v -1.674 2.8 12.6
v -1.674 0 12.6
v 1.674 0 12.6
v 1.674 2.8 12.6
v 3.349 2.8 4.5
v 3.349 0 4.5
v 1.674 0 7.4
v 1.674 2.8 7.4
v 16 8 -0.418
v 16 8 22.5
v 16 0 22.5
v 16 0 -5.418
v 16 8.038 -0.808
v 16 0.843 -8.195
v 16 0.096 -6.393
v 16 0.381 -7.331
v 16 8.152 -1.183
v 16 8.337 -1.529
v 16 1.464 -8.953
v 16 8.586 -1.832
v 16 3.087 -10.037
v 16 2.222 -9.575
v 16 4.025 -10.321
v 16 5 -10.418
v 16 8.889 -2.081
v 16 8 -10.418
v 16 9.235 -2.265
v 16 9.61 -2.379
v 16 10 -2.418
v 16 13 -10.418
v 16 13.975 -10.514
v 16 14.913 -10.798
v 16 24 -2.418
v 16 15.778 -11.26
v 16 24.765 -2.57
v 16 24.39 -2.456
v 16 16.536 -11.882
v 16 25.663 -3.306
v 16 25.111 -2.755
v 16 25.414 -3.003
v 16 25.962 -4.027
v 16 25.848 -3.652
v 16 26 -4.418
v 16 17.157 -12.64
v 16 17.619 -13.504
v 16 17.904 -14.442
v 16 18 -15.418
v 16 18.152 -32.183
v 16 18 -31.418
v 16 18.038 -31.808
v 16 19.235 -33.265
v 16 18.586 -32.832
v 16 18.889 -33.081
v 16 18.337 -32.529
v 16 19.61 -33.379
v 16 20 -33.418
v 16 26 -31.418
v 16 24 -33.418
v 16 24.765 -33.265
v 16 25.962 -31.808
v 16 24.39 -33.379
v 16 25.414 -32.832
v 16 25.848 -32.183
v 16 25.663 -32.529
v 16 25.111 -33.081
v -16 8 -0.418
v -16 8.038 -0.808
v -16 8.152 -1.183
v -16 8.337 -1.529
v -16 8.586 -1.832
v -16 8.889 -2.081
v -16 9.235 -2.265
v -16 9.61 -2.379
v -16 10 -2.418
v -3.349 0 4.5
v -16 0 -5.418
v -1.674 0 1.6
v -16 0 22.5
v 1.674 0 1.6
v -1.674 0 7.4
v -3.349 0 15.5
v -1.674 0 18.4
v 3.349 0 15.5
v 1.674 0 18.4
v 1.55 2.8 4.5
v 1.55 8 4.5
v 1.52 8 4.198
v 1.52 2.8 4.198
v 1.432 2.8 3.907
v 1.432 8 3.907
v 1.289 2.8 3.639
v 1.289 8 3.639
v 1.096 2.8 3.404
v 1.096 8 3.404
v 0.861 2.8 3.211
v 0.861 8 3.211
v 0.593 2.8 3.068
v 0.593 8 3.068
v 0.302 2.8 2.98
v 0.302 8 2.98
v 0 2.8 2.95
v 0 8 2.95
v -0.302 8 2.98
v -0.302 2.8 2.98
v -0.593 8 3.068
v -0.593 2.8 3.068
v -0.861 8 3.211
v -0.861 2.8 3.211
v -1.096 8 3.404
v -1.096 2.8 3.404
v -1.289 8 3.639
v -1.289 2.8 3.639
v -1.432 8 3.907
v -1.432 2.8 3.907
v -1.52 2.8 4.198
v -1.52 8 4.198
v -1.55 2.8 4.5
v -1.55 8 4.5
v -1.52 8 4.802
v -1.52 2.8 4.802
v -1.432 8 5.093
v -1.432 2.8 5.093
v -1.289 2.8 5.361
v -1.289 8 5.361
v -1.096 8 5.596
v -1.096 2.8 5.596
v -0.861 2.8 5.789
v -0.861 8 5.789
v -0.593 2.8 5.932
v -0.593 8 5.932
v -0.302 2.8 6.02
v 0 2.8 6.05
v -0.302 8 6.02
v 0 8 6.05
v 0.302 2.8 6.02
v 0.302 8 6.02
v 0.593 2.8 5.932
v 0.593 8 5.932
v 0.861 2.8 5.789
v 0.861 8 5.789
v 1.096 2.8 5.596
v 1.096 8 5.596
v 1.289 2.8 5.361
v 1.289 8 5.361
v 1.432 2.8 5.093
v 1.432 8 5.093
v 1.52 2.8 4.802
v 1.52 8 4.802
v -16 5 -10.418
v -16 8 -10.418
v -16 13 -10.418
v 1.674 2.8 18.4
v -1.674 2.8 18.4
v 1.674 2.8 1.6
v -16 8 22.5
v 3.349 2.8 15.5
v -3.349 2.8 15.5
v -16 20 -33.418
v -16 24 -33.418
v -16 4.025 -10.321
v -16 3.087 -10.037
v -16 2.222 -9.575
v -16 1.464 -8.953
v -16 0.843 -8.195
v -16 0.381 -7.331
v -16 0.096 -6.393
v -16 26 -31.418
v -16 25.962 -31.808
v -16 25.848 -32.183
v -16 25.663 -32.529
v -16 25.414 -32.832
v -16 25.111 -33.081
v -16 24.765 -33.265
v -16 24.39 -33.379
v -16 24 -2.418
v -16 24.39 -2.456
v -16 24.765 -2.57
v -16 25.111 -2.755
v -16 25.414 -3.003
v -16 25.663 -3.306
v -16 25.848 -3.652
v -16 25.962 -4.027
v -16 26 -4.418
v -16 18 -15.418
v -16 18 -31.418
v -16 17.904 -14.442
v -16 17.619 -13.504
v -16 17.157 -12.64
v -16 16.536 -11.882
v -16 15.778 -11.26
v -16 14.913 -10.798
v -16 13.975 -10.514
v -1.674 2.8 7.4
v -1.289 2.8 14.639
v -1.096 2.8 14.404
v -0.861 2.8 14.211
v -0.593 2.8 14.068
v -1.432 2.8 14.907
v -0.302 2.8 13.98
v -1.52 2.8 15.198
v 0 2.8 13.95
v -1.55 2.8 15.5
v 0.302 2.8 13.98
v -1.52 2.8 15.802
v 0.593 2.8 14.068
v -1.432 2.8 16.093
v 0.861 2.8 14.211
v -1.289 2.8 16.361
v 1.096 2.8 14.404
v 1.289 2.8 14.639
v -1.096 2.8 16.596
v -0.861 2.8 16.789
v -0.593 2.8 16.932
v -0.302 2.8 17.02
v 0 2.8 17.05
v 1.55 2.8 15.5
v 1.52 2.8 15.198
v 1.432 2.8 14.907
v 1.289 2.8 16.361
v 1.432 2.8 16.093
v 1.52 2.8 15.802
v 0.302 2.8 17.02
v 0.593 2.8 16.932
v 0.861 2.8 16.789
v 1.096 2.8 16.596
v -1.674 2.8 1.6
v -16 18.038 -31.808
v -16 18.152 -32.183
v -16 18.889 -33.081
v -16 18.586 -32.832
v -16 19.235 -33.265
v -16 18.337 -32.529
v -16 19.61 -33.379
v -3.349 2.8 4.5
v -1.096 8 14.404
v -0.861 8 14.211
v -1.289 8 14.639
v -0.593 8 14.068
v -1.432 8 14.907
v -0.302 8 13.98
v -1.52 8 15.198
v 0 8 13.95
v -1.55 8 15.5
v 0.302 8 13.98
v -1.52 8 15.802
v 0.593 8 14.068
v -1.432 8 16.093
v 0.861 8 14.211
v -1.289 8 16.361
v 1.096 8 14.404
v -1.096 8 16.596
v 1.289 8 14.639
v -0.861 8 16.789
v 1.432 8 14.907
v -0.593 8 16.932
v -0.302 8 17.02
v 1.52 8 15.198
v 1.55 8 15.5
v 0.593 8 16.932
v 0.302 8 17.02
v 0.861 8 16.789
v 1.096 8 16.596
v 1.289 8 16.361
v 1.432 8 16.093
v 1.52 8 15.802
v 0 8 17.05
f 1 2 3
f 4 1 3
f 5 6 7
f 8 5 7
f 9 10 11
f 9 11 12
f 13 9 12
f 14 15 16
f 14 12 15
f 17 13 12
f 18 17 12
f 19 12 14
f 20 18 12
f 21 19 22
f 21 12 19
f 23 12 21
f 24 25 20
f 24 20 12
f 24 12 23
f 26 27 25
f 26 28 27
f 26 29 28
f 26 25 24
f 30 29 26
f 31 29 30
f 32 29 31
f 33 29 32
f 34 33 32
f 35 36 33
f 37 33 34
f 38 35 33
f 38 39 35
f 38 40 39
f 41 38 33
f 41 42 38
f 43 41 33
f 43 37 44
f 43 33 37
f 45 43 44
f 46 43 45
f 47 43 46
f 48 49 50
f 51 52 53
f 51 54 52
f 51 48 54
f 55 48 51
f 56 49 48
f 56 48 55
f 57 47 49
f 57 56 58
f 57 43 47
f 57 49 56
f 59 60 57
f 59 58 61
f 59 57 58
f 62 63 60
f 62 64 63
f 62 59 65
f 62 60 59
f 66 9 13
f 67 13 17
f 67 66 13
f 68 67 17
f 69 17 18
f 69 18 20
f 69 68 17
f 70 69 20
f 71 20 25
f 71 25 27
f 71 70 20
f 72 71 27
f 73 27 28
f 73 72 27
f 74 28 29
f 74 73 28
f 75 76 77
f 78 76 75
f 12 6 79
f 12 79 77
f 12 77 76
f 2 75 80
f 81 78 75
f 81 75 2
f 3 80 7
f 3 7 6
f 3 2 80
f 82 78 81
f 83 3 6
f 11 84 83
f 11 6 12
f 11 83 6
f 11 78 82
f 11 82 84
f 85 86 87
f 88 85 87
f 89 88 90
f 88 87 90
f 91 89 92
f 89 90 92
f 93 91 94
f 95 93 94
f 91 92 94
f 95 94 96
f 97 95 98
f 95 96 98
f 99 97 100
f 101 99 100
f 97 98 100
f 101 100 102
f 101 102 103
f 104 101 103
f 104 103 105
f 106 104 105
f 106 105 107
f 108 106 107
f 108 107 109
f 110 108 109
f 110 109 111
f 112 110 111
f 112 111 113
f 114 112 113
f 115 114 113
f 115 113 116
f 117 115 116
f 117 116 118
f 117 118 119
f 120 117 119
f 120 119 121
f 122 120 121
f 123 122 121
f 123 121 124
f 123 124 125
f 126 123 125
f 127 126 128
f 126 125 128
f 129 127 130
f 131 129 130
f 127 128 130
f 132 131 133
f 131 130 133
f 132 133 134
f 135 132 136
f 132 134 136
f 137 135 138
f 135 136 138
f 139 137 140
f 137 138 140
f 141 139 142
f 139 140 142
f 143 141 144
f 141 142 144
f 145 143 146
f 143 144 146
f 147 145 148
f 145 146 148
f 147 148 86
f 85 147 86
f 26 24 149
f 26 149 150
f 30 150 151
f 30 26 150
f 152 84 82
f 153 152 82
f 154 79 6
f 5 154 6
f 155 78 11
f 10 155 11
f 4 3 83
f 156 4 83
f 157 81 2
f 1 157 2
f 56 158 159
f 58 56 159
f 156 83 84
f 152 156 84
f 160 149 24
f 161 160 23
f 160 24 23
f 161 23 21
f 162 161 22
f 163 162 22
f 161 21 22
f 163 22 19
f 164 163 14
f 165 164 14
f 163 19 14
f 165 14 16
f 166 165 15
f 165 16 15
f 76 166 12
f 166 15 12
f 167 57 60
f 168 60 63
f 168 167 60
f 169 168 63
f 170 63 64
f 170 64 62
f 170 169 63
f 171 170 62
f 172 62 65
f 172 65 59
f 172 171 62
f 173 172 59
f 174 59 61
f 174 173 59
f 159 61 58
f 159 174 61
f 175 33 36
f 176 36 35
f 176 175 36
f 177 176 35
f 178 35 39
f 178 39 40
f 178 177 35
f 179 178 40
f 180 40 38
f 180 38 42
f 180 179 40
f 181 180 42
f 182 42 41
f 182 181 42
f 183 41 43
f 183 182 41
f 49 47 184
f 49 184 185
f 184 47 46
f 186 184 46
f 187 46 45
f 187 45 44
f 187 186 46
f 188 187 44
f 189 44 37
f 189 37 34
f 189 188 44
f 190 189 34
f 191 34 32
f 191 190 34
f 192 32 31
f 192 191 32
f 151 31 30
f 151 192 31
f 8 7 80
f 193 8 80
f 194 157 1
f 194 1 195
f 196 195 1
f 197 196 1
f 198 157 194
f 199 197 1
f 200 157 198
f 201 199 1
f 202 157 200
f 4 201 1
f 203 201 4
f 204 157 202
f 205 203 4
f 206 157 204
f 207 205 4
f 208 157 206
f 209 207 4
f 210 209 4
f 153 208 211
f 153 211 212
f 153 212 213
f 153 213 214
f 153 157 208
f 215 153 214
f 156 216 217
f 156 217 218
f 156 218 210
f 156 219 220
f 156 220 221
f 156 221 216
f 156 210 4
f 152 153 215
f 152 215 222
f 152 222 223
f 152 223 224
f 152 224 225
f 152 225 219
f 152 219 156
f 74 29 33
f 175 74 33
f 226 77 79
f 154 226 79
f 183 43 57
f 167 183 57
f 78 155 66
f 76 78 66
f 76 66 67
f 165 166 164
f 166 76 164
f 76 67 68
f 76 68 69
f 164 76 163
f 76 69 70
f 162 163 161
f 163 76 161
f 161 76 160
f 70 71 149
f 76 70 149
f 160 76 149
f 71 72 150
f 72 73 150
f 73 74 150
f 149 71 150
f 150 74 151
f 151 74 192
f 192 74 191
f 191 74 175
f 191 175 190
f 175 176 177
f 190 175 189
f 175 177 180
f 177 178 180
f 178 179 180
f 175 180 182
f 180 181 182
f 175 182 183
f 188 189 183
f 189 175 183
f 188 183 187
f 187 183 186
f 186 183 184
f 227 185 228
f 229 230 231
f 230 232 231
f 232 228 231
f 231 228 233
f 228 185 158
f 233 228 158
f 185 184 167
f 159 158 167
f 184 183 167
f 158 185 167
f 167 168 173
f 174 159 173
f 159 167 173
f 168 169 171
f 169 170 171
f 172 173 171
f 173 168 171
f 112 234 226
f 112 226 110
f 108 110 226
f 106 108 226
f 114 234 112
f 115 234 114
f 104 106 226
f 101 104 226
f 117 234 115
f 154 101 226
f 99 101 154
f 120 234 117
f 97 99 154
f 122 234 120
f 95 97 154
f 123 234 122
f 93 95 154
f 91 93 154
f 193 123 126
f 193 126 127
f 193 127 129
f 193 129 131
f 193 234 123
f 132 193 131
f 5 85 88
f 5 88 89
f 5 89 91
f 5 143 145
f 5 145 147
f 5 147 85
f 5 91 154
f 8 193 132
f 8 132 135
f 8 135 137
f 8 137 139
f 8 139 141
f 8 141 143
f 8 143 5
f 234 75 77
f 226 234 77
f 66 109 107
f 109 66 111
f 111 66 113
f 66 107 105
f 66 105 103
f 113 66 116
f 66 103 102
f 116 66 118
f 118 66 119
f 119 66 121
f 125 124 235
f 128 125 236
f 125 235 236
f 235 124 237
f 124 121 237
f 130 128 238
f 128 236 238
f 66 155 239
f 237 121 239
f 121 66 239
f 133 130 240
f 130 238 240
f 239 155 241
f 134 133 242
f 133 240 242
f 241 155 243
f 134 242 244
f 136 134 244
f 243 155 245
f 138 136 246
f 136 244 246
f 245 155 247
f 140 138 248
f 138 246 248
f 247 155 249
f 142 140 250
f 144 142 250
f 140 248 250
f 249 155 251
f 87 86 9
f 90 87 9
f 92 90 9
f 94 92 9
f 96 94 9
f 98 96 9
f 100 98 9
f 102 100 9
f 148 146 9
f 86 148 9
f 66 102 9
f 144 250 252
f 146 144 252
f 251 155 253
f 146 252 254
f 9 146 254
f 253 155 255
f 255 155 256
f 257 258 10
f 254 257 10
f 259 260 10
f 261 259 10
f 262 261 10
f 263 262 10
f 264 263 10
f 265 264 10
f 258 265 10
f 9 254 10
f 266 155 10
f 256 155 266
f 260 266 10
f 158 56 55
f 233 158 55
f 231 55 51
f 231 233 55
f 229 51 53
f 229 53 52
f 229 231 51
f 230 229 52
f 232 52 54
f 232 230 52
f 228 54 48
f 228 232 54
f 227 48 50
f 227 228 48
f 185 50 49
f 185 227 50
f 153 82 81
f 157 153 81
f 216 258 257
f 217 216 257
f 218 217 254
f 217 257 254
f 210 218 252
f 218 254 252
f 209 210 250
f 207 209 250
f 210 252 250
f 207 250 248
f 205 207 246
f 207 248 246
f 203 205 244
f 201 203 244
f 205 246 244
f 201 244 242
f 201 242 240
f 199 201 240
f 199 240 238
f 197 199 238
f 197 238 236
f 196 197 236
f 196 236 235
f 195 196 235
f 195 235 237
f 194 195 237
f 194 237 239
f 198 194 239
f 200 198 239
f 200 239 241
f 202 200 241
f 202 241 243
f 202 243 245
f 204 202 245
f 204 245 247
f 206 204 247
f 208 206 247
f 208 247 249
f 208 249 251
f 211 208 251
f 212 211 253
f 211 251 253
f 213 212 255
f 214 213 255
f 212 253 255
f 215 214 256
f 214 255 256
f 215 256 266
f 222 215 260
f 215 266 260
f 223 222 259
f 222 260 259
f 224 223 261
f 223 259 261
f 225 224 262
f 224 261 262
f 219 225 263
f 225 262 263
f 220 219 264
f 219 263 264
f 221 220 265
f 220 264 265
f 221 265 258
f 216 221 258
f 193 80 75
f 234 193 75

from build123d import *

# Parameters (mm, degrees)
SKETCH_1_W              = 32
SKETCH_1_H              = 32.917571433
EXTRUDE_1_DEPTH         = 8
CUT_EXTRUDE_1_DEPTH     = 2.8
CUT_EXTRUDE_2_DEPTH     = 2.8
HOLE_WIZARD_3_1_3_1_1_D = 3.1
SKETCH_9_W              = 8
SKETCH_9_H              = 18
EXTRUDE_3_DEPTH         = 32
SKETCH_10_W             = 23
SKETCH_10_H             = 8
EXTRUDE_4_DEPTH         = 32
FILLET_1_R              = 2
FILLET_2_R              = 2
FILLET_3_R              = 5


with BuildPart() as part:
    # 草图1 → 凸台-拉伸1 (new body)
    with BuildSketch(Plane.XZ):
        with Locations((0, 6.041214283)):
            Rectangle(SKETCH_1_W, SKETCH_1_H)
    extrude(amount=-EXTRUDE_1_DEPTH)

    # 草图2 → 切除-拉伸1 (cut)
    with BuildSketch(Plane.XZ):
        Polygon((-1.674315781, 18.4), (-3.348631561, 15.5), (-1.674315781, 12.6), (1.674315781, 12.6), (3.348631561, 15.5), (1.674315781, 18.4), align=None)
    extrude(amount=-CUT_EXTRUDE_1_DEPTH, mode=Mode.SUBTRACT)

    # 草图3 → 切除-拉伸2 (cut)
    with BuildSketch(Plane.XZ):
        Polygon((1.674315781, 7.4), (-1.674315781, 7.4), (-3.348631561, 4.5), (-1.674315781, 1.6), (1.674315781, 1.6), (3.348631561, 4.5), align=None)
    extrude(amount=-CUT_EXTRUDE_2_DEPTH, mode=Mode.SUBTRACT)

    # Ø3.1 (3.1) 直径孔1 (through all)
    with Locations(Plane(origin=(0, 2.8, 0), x_dir=(-1, 0, 0), z_dir=(0, -1, 0))):
        with Locations((0, -4.5), (0, -15.5)):
            Hole(HOLE_WIZARD_3_1_3_1_1_D / 2)

    # 草图9 → 凸台-拉伸3 (add)
    with BuildSketch(Plane(origin=(16, 0, 0), x_dir=(0, 0, -1), z_dir=(1, 0, 0))):
        with Locations((6.417571433, 17)):
            Rectangle(SKETCH_9_W, SKETCH_9_H)
    extrude(amount=-EXTRUDE_3_DEPTH)

    # 草图10 → 凸台-拉伸4 (add)
    with BuildSketch(Plane(origin=(16, 0, 0), x_dir=(0, 0, -1), z_dir=(1, 0, 0))):
        with Locations((21.917571433, 22)):
            Rectangle(SKETCH_10_W, SKETCH_10_H)
    extrude(amount=-EXTRUDE_4_DEPTH)

    # 圆角1
    fillet_1_edges = [part.edges().sort_by_distance(p)[0] for p in [
        (0, 8, -2.417571433),
        (0, 26, -2.417571433),
    ]]
    fillet(fillet_1_edges, radius=FILLET_1_R)

    # 圆角2
    fillet_2_edges = [part.edges().sort_by_distance(p)[0] for p in [
        (0, 26, -33.417571433),
        (0, 18, -33.417571433),
    ]]
    fillet(fillet_2_edges, radius=FILLET_2_R)

    # 圆角3
    fillet_3_edges = [part.edges().sort_by_distance(p)[0] for p in [
        (0, 0, -10.417571433),
        (0, 18, -10.417571433),
    ]]
    fillet(fillet_3_edges, radius=FILLET_3_R)


solid = part.part
